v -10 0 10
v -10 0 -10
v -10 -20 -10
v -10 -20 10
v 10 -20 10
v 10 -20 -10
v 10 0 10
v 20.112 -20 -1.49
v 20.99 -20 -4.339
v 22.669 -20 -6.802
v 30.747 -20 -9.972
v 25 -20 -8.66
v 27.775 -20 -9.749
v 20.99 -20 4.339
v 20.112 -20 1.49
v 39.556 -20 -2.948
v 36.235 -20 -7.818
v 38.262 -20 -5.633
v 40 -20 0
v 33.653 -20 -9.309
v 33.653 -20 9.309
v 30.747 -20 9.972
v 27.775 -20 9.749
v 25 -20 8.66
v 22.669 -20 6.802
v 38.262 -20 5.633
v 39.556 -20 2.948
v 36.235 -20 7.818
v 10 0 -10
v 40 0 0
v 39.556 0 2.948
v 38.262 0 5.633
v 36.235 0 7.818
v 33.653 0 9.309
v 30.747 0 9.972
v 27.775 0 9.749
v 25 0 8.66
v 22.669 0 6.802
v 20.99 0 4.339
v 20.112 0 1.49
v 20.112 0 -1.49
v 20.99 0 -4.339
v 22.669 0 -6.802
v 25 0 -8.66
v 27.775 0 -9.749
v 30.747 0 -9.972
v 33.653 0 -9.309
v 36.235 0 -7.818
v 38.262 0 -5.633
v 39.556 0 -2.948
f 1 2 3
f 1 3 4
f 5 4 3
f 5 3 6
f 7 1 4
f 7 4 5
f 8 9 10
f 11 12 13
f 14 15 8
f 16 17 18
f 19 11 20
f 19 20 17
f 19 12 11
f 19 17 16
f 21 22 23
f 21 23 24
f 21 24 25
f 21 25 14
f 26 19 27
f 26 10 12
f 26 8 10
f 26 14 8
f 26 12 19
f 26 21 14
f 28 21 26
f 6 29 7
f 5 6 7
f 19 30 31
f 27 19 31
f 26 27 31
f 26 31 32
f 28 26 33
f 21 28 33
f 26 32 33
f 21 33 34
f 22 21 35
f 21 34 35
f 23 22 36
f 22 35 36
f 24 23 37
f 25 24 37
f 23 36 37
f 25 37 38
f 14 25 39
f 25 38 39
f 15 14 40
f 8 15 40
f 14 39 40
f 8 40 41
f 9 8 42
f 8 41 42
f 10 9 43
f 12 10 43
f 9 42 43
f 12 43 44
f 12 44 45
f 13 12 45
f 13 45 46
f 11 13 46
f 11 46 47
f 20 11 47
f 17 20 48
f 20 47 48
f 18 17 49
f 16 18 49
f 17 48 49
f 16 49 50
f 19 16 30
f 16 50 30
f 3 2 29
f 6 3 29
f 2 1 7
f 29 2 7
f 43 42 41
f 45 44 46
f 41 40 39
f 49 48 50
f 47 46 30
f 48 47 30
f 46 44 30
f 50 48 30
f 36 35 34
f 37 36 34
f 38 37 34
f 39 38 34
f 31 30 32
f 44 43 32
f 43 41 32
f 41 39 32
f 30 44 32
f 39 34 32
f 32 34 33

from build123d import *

# Parameters (mm, degrees)
F0_W     = 20
F0_H     = 20
F0_R     = 10
F1_DEPTH = 20


with BuildPart() as f1:
    # F0 (on Front) → F1 (new body)
    with BuildSketch(Plane.XZ):
        Rectangle(F0_W, F0_H)
        with Locations((30, 0)):
            Circle(F0_R)
    extrude(amount=F1_DEPTH)


solid = f1.part
